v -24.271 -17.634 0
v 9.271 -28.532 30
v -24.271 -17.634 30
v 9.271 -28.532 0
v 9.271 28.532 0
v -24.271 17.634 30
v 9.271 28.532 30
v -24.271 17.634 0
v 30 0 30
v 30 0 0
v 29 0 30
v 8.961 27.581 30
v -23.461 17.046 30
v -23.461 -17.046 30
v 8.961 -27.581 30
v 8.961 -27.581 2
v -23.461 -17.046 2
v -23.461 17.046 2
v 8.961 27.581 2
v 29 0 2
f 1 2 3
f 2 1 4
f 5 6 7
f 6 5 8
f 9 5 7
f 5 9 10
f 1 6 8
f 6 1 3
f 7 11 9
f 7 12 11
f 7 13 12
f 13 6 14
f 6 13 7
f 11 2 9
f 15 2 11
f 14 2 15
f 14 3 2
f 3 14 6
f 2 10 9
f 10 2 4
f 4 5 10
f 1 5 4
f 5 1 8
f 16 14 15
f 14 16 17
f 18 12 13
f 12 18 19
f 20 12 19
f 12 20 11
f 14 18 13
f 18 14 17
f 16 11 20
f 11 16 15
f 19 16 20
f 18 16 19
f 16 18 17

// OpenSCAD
// Simple Customizable Cup.

// By Donald E. King, 1/8/2013

// Written primarily to check out the Thingiverse.com Customizer feature.

// resolution of circles, cylinders and spheres
1_res = 5;  // [120, 60, 50, 40, 30, 20, 13, 12, 11, 10, 9, 8, 7, 6, 5, 4, 3]

// outside radius of cup
radius_1 = 30;

// height of cup
height_1 = 30;

// wall thickness (negative values produce a disc wthout walls)
t_wall = 1; //  [0.5, 1, 1.5, 2, 2.5, 3, 4, 5, -1]

// bottom thickness (negative values produce a hollow cylinder)
t_bottom = 2;  //  [0.5, 1, 1.5, 2, 2.5, 3, 4, 5, -1]


difference()
{

translate([0, 0, height_1/2])
cylinder(r = radius_1, h = height_1, center = true, $fn = 1_res);

translate([0, 0, t_bottom + 2*height_1/2])
cylinder(r = radius_1-t_wall, h = 2*height_1, center = true, $fn = 1_res);

}

